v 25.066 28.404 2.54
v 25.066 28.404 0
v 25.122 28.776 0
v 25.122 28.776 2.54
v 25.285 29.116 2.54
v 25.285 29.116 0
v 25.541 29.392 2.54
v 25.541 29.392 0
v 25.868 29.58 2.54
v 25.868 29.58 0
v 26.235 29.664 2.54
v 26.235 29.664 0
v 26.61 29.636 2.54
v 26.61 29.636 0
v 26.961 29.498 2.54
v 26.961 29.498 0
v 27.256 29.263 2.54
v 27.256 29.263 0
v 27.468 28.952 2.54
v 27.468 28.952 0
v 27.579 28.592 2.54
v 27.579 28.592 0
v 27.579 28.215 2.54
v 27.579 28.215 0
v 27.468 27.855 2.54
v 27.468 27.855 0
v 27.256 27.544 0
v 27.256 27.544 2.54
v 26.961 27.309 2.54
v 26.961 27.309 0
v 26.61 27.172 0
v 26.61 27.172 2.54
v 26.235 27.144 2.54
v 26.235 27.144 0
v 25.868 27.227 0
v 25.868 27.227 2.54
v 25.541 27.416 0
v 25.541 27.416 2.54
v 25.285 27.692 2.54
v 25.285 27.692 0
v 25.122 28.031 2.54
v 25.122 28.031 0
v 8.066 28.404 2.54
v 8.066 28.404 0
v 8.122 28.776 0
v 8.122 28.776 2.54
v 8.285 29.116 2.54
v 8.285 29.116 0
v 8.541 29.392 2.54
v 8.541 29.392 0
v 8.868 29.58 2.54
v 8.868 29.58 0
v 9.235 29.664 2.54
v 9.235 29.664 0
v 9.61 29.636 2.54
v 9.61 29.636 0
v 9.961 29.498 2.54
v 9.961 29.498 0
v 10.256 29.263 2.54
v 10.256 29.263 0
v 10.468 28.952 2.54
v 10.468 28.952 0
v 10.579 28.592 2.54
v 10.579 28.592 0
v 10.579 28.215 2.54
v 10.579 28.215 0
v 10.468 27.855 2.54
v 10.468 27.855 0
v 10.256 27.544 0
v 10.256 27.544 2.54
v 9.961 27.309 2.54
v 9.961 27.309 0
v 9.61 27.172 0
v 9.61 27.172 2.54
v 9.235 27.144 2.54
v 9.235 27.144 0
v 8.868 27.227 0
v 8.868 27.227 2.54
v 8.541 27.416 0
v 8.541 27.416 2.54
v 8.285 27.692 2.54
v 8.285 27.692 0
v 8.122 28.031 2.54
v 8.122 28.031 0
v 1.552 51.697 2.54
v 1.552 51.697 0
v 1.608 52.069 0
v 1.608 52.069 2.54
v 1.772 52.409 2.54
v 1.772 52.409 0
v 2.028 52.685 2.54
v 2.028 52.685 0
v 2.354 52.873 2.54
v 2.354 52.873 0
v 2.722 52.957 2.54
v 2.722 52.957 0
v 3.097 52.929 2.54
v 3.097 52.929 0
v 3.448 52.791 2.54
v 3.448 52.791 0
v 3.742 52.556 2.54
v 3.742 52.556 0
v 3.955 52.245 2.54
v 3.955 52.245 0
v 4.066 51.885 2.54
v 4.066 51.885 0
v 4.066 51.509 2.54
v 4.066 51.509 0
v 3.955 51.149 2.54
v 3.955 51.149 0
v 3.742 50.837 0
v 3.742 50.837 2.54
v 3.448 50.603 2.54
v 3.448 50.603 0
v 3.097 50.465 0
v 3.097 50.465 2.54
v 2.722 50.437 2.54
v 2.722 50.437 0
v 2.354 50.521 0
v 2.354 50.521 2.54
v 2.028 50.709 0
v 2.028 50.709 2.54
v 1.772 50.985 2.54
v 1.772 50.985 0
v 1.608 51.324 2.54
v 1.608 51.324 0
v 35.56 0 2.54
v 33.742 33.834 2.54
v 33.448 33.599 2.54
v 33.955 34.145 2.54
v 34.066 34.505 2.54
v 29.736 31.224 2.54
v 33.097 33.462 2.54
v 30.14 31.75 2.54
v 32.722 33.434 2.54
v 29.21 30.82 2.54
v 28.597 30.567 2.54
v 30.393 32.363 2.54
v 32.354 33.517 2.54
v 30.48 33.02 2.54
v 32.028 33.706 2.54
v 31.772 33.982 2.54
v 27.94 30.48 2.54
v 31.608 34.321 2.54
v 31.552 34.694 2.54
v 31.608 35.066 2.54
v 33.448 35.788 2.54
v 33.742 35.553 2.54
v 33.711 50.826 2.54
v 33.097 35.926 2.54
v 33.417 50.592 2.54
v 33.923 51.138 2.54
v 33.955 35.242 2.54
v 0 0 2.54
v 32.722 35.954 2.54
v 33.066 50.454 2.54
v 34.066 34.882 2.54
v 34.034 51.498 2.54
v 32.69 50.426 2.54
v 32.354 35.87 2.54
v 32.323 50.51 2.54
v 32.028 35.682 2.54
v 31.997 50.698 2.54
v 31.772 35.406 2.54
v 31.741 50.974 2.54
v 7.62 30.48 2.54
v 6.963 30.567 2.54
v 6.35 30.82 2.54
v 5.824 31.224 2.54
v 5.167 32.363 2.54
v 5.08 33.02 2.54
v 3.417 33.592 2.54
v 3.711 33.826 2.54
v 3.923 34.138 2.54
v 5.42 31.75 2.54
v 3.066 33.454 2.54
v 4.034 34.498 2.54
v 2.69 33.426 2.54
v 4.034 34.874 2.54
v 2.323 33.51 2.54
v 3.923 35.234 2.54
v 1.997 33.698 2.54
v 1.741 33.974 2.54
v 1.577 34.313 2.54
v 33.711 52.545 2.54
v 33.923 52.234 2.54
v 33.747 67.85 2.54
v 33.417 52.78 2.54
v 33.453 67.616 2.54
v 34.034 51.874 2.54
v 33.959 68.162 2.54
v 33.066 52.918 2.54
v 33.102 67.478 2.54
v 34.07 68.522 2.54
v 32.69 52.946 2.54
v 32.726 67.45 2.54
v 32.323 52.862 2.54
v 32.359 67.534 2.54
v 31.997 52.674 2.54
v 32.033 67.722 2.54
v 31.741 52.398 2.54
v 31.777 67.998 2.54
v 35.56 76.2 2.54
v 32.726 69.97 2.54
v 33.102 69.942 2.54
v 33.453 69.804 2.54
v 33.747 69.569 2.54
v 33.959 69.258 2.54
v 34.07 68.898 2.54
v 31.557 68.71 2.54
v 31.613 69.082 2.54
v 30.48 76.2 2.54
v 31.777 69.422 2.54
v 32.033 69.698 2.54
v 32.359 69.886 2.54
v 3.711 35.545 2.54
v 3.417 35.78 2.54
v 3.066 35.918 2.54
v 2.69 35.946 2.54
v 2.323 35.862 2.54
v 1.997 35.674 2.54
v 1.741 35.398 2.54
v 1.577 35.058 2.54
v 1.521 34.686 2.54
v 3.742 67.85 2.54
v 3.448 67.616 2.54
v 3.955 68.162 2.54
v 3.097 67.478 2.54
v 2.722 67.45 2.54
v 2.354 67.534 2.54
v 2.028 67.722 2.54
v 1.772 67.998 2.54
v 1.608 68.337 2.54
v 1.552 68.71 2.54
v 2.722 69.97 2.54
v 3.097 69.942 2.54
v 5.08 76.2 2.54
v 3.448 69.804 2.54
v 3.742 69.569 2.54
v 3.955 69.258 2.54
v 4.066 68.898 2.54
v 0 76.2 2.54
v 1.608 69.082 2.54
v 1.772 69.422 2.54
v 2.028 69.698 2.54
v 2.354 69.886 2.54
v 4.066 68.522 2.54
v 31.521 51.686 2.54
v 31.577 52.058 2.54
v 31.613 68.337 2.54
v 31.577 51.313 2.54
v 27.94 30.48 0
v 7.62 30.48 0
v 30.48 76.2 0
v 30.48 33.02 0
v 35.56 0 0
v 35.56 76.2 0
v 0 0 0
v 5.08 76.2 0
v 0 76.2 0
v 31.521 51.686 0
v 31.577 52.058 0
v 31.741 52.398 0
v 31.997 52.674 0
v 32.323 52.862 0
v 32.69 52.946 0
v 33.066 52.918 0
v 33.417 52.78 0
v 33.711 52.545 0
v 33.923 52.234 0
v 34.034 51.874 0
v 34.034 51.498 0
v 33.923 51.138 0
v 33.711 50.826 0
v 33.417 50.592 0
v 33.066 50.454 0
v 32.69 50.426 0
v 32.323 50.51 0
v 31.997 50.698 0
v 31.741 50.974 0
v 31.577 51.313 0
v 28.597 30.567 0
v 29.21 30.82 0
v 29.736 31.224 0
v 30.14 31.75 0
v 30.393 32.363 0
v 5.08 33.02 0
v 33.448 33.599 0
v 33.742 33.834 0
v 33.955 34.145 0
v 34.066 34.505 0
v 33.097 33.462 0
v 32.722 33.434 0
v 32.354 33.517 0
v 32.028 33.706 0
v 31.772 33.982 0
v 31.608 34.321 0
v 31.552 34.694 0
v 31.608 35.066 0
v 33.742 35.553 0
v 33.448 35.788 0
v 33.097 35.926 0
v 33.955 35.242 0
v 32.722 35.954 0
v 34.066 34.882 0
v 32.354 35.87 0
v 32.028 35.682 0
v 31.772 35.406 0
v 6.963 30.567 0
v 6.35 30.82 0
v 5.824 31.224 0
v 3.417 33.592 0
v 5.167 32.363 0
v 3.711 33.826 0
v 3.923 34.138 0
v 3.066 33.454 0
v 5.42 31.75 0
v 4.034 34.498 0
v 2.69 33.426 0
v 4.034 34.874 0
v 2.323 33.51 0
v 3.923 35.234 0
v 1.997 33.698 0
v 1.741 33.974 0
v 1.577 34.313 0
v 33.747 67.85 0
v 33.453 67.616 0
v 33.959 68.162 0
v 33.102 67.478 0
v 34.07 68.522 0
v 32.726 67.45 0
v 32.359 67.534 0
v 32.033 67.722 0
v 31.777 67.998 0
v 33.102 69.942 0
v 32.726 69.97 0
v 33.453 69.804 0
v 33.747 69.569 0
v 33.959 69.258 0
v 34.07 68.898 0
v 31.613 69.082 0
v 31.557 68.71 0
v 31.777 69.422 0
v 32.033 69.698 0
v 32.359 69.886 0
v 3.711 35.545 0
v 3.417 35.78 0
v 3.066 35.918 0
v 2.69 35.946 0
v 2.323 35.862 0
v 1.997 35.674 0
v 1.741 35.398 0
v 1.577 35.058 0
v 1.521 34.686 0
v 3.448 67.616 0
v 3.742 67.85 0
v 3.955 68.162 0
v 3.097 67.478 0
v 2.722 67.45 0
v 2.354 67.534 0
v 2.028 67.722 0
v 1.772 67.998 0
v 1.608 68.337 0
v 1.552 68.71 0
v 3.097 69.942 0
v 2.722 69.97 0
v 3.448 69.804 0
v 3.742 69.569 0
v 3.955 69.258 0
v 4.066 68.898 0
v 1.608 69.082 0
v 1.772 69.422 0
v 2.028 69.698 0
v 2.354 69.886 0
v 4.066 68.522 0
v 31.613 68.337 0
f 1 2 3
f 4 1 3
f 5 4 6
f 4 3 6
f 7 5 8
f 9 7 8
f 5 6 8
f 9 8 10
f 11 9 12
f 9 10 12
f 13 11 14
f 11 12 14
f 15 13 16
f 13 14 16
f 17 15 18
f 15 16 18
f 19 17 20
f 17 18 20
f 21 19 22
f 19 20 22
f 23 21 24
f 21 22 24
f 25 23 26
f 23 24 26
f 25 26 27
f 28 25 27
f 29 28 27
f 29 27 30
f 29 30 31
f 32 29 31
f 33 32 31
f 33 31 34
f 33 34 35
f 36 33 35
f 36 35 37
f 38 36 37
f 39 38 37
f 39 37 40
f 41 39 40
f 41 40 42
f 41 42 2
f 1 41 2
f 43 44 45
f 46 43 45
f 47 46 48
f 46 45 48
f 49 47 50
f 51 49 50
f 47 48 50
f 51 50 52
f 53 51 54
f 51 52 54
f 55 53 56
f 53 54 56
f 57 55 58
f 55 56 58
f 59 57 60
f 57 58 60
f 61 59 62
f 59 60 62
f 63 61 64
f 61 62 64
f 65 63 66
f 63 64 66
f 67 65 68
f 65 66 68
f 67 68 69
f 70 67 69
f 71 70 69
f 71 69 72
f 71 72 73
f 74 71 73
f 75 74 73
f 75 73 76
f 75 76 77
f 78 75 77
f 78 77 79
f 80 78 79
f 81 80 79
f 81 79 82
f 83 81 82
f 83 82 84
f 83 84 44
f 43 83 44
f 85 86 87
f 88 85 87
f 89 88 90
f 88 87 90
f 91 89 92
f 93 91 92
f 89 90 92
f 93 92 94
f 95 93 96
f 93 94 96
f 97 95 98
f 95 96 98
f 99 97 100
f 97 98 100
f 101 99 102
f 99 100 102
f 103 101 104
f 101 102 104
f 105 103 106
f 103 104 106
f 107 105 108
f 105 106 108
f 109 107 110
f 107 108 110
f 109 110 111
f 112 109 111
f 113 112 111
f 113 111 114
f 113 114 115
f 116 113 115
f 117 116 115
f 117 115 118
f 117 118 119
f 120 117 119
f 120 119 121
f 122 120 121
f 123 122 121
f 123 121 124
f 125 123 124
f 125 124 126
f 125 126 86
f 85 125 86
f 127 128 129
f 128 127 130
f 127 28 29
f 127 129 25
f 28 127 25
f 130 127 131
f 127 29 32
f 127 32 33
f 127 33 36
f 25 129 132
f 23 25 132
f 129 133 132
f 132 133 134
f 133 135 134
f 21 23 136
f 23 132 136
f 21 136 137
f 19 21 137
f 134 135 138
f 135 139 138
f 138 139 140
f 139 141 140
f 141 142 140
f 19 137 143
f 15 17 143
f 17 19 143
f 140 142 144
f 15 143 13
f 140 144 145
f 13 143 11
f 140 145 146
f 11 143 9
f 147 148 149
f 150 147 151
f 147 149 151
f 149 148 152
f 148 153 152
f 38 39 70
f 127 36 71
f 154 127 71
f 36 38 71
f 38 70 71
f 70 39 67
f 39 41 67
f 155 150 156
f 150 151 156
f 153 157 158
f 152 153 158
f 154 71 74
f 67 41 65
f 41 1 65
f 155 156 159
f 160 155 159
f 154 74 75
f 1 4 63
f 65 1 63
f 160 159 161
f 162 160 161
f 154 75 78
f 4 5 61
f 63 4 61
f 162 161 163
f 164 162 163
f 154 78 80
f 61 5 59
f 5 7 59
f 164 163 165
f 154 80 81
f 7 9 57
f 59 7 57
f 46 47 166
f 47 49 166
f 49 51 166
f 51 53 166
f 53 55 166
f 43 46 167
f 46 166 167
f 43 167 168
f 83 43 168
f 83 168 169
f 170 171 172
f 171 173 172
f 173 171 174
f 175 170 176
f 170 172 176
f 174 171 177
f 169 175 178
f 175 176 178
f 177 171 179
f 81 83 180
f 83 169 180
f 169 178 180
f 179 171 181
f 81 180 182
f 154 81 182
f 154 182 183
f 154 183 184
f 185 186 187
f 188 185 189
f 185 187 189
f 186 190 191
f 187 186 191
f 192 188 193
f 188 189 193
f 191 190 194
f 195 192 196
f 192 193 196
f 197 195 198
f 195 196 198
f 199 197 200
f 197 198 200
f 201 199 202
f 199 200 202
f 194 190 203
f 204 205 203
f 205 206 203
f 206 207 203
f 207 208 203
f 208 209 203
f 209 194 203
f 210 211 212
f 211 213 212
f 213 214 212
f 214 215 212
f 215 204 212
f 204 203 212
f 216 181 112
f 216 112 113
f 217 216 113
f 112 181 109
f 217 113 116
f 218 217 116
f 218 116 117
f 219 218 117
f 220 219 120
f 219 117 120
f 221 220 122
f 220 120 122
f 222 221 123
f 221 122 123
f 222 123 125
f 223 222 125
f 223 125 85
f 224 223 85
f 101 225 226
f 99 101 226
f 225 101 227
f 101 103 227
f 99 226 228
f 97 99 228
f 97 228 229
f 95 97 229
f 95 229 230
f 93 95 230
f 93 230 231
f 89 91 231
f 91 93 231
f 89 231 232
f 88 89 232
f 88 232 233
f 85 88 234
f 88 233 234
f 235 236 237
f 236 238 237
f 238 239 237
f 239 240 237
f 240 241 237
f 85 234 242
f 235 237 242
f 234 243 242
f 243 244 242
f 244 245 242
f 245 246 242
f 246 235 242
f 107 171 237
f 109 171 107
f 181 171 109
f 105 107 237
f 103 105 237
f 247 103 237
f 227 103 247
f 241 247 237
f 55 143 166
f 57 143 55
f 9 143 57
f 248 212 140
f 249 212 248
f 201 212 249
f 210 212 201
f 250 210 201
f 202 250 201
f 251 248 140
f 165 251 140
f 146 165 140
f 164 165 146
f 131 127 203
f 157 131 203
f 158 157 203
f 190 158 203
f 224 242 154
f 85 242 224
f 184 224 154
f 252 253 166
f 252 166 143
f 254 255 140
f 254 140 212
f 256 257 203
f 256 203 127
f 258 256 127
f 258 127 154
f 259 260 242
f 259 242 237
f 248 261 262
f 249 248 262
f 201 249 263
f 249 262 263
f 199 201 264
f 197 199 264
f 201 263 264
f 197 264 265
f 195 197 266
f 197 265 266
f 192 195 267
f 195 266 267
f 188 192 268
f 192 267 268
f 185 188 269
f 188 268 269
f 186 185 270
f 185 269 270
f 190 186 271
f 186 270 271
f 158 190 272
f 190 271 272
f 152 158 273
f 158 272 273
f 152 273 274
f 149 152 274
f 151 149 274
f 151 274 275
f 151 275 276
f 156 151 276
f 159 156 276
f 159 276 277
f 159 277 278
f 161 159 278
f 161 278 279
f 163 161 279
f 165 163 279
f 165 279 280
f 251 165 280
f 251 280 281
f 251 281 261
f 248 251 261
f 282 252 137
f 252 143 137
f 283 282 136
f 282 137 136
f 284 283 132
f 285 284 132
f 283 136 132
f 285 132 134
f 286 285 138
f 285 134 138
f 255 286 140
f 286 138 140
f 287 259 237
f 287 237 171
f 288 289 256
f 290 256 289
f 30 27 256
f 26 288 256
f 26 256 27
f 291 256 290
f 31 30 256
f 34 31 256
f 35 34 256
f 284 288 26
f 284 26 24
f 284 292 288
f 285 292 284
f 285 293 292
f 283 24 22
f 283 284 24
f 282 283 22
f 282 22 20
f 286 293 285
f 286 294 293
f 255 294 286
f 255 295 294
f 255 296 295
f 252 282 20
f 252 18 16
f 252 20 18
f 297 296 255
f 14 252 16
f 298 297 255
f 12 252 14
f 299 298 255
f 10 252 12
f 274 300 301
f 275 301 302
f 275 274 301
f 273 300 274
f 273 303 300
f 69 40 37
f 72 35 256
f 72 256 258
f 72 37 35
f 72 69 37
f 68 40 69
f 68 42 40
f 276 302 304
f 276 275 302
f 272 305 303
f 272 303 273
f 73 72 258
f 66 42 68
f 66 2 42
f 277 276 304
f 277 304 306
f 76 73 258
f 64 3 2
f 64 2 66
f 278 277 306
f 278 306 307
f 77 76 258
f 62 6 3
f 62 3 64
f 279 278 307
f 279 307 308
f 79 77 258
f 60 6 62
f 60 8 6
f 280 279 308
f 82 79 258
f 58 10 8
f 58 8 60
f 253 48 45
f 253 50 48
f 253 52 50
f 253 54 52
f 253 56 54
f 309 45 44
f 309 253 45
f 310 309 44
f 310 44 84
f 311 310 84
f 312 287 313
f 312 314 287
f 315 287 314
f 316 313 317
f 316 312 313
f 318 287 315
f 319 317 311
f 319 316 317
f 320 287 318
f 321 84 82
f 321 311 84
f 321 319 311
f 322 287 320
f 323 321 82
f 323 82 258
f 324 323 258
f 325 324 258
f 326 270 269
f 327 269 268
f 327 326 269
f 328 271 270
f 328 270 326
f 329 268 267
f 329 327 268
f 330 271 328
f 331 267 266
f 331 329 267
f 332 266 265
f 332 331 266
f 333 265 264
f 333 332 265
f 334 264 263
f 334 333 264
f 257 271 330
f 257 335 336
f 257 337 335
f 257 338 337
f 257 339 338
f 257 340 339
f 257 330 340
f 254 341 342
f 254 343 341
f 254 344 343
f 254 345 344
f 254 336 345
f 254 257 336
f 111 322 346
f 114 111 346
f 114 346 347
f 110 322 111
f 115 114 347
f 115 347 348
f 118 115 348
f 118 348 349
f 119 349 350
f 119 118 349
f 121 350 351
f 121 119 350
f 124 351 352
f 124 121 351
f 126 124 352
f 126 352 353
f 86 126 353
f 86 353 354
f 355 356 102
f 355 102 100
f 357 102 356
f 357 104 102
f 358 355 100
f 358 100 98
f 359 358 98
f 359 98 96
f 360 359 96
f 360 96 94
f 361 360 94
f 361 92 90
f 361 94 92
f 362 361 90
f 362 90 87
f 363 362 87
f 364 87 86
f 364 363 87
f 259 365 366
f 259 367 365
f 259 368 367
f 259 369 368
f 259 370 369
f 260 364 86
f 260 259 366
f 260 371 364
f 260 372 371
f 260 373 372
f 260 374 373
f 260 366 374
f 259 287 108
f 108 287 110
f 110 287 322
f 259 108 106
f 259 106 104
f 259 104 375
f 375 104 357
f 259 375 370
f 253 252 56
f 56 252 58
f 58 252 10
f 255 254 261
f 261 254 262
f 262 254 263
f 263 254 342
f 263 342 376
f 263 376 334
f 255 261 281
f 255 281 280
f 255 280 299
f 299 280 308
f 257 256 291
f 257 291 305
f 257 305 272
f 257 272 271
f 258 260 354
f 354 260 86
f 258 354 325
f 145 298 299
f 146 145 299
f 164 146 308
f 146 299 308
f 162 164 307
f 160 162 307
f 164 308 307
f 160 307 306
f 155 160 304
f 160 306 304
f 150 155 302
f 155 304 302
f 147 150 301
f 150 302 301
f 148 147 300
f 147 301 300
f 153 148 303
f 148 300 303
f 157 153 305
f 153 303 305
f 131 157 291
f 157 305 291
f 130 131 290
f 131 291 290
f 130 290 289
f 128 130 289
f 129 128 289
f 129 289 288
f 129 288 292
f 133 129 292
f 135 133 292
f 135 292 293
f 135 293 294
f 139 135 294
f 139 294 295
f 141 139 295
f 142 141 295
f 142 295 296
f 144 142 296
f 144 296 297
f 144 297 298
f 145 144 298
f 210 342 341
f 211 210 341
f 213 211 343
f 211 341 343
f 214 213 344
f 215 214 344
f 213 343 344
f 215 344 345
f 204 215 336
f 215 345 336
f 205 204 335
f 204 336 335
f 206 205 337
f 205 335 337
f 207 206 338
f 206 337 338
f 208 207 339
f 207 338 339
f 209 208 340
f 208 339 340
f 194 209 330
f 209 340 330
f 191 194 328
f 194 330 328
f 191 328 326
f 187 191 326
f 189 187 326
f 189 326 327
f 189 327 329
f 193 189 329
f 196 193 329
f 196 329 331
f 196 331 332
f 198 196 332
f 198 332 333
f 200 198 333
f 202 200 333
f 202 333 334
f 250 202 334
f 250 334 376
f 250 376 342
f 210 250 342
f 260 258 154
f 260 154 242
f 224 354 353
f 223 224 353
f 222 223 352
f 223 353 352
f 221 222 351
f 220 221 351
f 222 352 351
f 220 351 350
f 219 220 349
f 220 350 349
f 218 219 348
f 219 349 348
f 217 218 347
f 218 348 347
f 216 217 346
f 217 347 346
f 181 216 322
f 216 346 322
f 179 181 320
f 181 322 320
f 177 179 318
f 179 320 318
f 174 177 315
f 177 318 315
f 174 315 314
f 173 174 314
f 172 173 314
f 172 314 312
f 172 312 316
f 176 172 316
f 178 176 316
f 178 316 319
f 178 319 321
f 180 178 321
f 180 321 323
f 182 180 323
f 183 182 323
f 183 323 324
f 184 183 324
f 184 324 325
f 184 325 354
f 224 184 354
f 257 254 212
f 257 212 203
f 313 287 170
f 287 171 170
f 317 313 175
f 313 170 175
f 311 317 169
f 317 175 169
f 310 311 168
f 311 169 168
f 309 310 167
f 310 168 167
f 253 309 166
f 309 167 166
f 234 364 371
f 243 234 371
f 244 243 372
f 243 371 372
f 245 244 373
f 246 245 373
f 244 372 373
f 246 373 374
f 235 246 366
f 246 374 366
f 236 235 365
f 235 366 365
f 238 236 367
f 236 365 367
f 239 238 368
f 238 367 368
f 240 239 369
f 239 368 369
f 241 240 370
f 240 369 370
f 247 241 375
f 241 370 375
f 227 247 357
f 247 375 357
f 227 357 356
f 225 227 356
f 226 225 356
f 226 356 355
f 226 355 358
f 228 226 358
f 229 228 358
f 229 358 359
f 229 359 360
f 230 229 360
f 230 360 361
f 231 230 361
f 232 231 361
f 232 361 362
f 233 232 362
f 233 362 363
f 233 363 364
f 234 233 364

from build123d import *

# Parameters (mm, degrees)
BOSS_EXTRUDE1_DEPTH          = 2.54
FILLET1_R                    = 2.54
F_39_0_0995_DIAMETER_HOLE1_D = 2.5273


with BuildPart() as part:
    # Sketch1 → Boss-Extrude1 (new body)
    with BuildSketch(Plane.XY):
        Polygon((0, 0), (0, 76.2), (5.08, 76.2), (5.08, 30.48), (30.48, 30.48), (30.48, 76.2), (35.56, 76.2), (35.56, 0), align=None)
    extrude(amount=BOSS_EXTRUDE1_DEPTH)

    # Fillet1
    fillet1_edges = [part.edges().sort_by_distance(p)[0] for p in [
        (5.08, 30.48, 1.27),
        (30.48, 30.48, 1.27),
    ]]
    fillet(fillet1_edges, radius=FILLET1_R)

    # #39 (0.0995) Diameter Hole1 (through all)
    with Locations(Plane.XY.offset(2.54)):
        with Locations((32.820840104, 68.709866644), (32.784904498, 51.685945396), (32.816003505, 34.693675088), (26.329237865, 28.403700876), (9.329223304, 28.403700876), (2.784904498, 34.68594536), (2.816003505, 51.696905496), (2.816003505, 68.709866644)):
            Hole(F_39_0_0995_DIAMETER_HOLE1_D / 2)


solid = part.part
